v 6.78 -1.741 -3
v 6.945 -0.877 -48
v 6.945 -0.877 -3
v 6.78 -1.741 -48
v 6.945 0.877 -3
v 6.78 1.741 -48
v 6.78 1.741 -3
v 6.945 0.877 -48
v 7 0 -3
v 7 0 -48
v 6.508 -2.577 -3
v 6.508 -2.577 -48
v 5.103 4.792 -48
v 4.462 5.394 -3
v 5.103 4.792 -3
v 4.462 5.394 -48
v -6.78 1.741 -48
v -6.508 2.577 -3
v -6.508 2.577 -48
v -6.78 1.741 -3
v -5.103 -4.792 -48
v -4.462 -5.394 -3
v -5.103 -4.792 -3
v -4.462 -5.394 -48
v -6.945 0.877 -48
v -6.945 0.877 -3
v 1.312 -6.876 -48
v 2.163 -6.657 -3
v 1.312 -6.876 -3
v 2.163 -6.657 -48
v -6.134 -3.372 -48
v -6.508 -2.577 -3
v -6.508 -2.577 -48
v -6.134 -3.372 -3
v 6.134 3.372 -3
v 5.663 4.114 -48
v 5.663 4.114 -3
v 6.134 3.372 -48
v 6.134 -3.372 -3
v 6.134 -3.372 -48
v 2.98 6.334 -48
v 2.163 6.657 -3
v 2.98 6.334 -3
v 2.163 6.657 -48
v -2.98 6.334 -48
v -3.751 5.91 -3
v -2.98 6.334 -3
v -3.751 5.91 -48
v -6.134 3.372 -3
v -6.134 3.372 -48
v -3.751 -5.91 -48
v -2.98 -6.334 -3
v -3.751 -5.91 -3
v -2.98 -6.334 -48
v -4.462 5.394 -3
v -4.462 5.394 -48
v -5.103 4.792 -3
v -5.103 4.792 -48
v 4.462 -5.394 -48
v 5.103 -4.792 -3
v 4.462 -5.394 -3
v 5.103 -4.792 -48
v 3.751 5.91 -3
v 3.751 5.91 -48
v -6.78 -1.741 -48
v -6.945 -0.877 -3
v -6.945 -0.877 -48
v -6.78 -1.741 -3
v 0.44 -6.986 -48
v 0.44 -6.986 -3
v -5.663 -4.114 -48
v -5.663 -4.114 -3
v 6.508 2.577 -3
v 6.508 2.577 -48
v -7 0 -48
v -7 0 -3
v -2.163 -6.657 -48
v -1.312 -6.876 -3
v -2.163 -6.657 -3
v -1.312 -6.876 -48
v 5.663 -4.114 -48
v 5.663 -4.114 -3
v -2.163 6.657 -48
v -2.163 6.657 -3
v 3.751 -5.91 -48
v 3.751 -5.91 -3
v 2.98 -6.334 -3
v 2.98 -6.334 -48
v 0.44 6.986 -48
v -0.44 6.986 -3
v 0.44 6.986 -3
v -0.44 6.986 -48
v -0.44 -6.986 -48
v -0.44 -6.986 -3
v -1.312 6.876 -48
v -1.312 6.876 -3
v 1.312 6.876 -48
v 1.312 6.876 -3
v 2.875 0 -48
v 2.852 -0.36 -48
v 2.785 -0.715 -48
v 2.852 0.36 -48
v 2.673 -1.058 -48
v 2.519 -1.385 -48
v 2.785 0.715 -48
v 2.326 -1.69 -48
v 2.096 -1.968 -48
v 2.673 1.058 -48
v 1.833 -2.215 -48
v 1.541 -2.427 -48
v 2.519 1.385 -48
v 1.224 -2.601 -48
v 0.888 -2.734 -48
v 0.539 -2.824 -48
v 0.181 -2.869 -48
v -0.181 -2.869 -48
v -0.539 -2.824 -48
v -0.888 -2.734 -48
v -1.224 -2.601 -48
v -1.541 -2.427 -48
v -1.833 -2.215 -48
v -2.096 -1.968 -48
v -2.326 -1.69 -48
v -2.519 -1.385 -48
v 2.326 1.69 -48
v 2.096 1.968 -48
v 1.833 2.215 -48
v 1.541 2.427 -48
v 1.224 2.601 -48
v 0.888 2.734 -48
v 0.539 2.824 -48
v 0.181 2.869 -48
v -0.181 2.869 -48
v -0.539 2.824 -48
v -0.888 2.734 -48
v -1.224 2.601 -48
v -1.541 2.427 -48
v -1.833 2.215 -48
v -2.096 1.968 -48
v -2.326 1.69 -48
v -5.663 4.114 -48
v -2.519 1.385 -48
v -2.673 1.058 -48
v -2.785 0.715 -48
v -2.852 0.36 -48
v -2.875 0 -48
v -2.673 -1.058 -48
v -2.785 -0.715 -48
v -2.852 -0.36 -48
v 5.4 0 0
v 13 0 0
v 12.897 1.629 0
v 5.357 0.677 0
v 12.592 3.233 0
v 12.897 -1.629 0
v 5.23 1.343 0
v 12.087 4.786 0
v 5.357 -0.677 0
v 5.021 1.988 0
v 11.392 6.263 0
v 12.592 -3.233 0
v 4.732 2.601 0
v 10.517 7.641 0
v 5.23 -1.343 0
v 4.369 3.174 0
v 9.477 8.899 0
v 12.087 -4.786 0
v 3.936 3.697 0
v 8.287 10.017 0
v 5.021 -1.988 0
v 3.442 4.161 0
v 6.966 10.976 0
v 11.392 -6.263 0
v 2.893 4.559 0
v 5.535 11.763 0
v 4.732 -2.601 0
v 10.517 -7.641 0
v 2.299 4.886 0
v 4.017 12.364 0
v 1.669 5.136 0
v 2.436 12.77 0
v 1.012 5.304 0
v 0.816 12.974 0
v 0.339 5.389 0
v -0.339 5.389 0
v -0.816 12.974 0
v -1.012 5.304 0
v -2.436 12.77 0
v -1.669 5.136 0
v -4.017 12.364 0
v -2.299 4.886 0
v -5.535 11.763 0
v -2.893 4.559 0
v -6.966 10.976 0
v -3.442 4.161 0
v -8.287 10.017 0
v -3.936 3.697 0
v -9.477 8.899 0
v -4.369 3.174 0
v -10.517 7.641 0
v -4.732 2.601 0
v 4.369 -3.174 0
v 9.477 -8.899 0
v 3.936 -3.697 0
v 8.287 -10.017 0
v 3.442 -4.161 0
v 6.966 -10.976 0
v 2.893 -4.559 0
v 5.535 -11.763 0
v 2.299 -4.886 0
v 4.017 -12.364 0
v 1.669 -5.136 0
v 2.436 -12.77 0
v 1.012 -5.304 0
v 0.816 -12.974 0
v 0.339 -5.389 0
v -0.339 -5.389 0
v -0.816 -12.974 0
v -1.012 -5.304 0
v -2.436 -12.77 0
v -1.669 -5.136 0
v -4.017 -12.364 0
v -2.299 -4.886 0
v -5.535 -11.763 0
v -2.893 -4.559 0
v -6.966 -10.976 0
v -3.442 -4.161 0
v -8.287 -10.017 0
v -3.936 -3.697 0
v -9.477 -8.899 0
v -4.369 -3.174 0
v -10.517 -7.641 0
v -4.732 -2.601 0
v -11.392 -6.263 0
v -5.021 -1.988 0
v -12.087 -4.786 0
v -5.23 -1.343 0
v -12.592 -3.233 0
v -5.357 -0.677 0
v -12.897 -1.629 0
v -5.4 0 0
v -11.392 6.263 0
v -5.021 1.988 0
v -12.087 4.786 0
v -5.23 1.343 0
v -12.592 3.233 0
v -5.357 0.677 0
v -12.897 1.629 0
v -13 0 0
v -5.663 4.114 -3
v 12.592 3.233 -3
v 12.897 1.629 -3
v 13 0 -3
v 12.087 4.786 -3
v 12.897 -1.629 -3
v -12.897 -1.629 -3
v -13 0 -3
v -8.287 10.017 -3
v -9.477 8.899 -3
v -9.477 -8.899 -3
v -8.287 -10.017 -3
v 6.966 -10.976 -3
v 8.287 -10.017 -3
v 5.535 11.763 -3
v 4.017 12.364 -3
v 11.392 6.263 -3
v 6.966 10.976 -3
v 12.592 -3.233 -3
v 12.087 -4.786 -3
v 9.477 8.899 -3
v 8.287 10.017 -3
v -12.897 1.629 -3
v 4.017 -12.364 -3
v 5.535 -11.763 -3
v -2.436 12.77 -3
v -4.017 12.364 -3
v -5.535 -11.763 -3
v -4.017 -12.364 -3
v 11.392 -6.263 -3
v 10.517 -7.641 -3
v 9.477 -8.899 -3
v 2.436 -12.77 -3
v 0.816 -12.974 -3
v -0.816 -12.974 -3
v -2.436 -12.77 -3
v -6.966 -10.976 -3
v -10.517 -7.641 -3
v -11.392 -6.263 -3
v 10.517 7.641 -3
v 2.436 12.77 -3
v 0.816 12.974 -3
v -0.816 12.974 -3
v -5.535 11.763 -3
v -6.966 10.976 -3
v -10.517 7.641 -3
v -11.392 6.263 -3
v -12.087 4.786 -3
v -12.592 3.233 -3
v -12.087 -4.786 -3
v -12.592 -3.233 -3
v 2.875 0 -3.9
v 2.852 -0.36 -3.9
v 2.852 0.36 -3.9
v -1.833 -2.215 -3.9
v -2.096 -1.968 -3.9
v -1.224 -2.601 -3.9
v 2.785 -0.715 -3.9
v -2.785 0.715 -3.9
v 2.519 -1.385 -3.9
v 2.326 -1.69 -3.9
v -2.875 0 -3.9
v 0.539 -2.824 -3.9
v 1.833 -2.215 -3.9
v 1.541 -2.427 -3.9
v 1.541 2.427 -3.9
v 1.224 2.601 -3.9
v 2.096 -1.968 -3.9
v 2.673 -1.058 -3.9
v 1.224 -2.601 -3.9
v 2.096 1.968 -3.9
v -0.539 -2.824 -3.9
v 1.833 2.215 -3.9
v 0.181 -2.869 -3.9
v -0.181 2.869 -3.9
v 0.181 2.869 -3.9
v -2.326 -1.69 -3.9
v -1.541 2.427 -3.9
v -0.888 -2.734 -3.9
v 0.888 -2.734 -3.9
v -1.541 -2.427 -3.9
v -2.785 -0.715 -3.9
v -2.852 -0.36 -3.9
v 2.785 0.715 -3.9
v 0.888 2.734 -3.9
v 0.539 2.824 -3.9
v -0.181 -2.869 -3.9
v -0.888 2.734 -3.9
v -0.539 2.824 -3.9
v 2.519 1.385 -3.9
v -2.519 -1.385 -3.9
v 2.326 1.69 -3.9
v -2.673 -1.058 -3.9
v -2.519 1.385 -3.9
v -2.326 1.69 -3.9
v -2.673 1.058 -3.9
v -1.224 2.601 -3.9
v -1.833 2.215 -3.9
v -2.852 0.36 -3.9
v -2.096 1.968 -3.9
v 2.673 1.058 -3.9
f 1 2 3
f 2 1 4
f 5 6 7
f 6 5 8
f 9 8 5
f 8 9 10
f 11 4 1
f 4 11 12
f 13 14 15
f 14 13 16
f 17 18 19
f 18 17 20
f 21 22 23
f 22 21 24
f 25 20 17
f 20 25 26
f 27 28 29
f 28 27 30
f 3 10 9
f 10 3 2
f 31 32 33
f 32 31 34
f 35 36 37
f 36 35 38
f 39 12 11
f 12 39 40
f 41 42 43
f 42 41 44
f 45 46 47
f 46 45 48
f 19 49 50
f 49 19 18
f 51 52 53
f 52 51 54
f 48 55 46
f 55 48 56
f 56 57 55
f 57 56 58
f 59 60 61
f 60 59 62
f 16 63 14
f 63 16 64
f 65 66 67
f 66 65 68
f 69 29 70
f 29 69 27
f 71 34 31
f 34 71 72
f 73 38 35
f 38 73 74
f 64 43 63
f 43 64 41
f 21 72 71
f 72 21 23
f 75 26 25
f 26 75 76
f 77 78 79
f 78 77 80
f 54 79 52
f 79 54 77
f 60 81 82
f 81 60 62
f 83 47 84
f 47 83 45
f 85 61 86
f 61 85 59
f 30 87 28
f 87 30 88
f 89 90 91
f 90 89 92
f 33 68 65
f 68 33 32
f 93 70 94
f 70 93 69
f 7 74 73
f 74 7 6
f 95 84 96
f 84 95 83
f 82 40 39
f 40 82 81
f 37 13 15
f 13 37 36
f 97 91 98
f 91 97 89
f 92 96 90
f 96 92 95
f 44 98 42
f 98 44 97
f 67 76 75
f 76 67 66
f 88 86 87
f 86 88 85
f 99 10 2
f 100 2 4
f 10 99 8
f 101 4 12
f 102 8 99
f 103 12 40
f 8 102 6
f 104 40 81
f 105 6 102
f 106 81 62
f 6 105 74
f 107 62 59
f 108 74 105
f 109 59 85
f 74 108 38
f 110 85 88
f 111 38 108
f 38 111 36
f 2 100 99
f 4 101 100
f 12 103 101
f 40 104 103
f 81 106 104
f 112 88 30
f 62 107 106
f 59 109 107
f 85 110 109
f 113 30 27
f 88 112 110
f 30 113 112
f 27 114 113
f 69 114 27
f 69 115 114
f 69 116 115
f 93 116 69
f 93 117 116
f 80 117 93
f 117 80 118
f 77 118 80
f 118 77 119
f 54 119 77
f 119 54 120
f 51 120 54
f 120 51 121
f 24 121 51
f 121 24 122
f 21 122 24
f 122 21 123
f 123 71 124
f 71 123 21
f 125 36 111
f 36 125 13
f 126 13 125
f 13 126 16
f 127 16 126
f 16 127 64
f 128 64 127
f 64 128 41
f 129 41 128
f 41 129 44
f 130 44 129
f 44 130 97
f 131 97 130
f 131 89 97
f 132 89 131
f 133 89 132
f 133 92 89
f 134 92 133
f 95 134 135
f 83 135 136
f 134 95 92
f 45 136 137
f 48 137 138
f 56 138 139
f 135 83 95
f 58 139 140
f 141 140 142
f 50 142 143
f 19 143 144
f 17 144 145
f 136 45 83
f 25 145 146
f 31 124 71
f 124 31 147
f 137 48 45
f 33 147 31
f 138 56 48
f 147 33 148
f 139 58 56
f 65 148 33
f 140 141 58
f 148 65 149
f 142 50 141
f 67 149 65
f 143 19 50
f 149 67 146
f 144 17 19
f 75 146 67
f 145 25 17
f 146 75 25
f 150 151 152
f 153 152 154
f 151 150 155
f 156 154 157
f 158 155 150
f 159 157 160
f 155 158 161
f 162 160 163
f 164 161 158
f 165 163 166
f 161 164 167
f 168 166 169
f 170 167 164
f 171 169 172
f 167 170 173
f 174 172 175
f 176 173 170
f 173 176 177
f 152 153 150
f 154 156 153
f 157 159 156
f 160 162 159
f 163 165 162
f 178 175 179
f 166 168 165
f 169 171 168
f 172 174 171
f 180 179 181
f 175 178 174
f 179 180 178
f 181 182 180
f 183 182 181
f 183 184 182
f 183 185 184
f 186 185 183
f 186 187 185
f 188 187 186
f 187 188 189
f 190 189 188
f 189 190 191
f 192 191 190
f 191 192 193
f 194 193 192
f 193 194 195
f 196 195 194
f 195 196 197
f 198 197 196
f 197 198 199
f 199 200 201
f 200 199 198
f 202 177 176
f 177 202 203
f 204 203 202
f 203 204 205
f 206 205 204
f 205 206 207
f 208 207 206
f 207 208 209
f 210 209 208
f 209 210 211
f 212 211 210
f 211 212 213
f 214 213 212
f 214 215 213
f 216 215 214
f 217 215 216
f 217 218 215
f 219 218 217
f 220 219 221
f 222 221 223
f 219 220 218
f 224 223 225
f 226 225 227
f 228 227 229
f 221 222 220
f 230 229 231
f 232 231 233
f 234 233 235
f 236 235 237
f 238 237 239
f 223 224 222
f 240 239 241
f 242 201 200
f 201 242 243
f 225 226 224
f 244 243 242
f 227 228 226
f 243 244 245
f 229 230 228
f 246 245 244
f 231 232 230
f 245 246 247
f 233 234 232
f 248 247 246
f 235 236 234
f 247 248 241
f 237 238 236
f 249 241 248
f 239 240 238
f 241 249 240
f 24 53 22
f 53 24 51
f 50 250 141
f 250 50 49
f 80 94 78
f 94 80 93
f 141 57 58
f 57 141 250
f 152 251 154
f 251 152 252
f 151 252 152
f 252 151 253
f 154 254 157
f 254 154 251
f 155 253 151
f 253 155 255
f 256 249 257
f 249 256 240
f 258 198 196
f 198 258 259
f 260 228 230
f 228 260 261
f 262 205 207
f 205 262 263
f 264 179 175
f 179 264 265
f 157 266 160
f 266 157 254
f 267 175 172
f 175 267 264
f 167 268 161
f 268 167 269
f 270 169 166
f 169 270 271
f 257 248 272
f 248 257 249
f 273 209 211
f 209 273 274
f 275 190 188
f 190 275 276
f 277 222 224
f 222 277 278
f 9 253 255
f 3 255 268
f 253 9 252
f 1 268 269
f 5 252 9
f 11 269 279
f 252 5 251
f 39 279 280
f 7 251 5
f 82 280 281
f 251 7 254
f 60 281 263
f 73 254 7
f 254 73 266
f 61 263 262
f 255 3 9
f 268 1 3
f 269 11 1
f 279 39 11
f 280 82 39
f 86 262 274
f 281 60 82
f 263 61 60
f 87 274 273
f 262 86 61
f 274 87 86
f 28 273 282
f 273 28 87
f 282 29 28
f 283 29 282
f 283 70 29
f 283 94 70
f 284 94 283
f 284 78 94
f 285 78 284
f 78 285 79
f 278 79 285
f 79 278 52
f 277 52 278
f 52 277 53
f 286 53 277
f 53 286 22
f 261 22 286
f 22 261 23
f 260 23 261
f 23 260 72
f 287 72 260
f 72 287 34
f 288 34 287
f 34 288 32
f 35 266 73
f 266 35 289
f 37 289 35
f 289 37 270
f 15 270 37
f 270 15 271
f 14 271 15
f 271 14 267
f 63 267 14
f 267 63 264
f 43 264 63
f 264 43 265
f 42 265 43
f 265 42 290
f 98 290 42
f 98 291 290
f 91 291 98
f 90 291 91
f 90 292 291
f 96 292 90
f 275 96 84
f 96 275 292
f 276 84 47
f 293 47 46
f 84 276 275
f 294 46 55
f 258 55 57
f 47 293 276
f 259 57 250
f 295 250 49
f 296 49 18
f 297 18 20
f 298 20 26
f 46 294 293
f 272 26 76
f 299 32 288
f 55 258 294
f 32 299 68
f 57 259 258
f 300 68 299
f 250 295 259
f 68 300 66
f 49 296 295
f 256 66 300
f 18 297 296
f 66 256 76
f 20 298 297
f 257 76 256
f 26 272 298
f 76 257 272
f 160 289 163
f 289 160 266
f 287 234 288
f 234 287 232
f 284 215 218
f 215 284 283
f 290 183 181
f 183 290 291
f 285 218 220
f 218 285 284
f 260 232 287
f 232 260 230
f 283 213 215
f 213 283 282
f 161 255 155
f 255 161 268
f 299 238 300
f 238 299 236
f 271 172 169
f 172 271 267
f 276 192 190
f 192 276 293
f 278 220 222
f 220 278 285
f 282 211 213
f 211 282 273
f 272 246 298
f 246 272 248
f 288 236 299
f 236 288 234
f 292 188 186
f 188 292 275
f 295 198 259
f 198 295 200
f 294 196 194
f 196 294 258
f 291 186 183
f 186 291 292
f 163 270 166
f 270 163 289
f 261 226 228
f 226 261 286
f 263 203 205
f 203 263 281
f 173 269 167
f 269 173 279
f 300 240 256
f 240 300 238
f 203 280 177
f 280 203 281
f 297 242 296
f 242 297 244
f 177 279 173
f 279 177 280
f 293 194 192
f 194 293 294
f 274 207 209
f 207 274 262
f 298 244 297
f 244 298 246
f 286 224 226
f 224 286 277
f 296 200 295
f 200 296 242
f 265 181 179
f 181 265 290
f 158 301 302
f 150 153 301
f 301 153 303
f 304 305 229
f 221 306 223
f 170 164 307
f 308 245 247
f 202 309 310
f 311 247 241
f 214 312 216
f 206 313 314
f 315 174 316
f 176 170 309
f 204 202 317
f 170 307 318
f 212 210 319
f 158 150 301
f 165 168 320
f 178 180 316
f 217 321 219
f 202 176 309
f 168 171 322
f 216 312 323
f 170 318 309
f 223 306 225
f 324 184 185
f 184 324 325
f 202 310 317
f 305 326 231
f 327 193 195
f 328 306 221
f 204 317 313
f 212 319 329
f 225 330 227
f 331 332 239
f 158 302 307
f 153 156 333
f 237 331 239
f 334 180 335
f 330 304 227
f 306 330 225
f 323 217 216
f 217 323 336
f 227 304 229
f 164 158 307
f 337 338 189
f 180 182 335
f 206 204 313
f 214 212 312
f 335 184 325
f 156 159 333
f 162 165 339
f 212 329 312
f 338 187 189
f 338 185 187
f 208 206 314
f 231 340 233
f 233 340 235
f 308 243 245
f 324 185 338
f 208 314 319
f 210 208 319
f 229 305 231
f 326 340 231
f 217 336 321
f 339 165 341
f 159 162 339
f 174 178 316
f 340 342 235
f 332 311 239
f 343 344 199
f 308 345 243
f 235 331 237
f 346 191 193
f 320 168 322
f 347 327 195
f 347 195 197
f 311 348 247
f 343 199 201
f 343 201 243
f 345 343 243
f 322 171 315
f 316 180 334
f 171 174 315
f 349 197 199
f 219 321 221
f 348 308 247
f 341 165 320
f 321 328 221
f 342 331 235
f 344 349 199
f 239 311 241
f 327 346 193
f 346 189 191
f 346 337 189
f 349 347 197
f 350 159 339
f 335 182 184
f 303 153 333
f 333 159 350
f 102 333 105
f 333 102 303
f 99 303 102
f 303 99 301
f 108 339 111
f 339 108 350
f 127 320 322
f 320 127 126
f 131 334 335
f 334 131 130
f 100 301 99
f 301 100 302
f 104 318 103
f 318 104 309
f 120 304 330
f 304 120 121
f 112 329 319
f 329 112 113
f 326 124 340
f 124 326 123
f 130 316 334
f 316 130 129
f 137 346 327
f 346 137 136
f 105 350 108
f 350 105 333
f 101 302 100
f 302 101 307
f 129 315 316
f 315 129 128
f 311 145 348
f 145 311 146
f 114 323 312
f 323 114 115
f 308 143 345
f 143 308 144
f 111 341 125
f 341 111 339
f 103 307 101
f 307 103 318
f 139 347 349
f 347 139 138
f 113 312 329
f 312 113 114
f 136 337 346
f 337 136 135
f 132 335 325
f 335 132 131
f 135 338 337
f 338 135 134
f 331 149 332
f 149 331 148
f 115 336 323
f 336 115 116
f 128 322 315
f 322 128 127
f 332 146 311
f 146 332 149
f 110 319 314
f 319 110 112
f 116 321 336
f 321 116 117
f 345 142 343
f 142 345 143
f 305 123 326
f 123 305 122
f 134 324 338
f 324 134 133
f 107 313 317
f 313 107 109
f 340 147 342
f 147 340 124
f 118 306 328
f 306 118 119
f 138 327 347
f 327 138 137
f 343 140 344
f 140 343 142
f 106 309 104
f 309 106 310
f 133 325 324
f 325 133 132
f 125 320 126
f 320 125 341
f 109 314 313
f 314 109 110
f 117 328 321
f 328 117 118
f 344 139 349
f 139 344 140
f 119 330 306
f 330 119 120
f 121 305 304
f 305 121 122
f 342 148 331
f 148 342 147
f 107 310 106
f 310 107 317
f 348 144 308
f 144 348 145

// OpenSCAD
$fn = 50;


difference() {
	union() {
		translate(v = [0, 0, -48.0000000000]) {
			cylinder(h = 48, r = 7.0000000000);
		}
		translate(v = [0, 0, -3.0000000000]) {
			cylinder(h = 3, r = 13.0000000000);
		}
	}
	union() {
		translate(v = [0, 0, 0]) {
			rotate(a = [0, 0, 0]) {
				difference() {
					union() {
						#translate(v = [0, 0, -48.0000000000]) {
							cylinder(h = 48, r = 2.6000000000);
						}
						#translate(v = [0, 0, -3.9000000000]) {
							cylinder(h = 3.9000000000, r1 = 2.8750000000, r2 = 5.4000000000);
						}
						#translate(v = [0, 0, -48.0000000000]) {
							cylinder(h = 48, r = 2.8750000000);
						}
						#translate(v = [0, 0, -48.0000000000]) {
							cylinder(h = 48, r = 2.6000000000);
						}
					}
					union();
				}
			}
		}
	}
}
